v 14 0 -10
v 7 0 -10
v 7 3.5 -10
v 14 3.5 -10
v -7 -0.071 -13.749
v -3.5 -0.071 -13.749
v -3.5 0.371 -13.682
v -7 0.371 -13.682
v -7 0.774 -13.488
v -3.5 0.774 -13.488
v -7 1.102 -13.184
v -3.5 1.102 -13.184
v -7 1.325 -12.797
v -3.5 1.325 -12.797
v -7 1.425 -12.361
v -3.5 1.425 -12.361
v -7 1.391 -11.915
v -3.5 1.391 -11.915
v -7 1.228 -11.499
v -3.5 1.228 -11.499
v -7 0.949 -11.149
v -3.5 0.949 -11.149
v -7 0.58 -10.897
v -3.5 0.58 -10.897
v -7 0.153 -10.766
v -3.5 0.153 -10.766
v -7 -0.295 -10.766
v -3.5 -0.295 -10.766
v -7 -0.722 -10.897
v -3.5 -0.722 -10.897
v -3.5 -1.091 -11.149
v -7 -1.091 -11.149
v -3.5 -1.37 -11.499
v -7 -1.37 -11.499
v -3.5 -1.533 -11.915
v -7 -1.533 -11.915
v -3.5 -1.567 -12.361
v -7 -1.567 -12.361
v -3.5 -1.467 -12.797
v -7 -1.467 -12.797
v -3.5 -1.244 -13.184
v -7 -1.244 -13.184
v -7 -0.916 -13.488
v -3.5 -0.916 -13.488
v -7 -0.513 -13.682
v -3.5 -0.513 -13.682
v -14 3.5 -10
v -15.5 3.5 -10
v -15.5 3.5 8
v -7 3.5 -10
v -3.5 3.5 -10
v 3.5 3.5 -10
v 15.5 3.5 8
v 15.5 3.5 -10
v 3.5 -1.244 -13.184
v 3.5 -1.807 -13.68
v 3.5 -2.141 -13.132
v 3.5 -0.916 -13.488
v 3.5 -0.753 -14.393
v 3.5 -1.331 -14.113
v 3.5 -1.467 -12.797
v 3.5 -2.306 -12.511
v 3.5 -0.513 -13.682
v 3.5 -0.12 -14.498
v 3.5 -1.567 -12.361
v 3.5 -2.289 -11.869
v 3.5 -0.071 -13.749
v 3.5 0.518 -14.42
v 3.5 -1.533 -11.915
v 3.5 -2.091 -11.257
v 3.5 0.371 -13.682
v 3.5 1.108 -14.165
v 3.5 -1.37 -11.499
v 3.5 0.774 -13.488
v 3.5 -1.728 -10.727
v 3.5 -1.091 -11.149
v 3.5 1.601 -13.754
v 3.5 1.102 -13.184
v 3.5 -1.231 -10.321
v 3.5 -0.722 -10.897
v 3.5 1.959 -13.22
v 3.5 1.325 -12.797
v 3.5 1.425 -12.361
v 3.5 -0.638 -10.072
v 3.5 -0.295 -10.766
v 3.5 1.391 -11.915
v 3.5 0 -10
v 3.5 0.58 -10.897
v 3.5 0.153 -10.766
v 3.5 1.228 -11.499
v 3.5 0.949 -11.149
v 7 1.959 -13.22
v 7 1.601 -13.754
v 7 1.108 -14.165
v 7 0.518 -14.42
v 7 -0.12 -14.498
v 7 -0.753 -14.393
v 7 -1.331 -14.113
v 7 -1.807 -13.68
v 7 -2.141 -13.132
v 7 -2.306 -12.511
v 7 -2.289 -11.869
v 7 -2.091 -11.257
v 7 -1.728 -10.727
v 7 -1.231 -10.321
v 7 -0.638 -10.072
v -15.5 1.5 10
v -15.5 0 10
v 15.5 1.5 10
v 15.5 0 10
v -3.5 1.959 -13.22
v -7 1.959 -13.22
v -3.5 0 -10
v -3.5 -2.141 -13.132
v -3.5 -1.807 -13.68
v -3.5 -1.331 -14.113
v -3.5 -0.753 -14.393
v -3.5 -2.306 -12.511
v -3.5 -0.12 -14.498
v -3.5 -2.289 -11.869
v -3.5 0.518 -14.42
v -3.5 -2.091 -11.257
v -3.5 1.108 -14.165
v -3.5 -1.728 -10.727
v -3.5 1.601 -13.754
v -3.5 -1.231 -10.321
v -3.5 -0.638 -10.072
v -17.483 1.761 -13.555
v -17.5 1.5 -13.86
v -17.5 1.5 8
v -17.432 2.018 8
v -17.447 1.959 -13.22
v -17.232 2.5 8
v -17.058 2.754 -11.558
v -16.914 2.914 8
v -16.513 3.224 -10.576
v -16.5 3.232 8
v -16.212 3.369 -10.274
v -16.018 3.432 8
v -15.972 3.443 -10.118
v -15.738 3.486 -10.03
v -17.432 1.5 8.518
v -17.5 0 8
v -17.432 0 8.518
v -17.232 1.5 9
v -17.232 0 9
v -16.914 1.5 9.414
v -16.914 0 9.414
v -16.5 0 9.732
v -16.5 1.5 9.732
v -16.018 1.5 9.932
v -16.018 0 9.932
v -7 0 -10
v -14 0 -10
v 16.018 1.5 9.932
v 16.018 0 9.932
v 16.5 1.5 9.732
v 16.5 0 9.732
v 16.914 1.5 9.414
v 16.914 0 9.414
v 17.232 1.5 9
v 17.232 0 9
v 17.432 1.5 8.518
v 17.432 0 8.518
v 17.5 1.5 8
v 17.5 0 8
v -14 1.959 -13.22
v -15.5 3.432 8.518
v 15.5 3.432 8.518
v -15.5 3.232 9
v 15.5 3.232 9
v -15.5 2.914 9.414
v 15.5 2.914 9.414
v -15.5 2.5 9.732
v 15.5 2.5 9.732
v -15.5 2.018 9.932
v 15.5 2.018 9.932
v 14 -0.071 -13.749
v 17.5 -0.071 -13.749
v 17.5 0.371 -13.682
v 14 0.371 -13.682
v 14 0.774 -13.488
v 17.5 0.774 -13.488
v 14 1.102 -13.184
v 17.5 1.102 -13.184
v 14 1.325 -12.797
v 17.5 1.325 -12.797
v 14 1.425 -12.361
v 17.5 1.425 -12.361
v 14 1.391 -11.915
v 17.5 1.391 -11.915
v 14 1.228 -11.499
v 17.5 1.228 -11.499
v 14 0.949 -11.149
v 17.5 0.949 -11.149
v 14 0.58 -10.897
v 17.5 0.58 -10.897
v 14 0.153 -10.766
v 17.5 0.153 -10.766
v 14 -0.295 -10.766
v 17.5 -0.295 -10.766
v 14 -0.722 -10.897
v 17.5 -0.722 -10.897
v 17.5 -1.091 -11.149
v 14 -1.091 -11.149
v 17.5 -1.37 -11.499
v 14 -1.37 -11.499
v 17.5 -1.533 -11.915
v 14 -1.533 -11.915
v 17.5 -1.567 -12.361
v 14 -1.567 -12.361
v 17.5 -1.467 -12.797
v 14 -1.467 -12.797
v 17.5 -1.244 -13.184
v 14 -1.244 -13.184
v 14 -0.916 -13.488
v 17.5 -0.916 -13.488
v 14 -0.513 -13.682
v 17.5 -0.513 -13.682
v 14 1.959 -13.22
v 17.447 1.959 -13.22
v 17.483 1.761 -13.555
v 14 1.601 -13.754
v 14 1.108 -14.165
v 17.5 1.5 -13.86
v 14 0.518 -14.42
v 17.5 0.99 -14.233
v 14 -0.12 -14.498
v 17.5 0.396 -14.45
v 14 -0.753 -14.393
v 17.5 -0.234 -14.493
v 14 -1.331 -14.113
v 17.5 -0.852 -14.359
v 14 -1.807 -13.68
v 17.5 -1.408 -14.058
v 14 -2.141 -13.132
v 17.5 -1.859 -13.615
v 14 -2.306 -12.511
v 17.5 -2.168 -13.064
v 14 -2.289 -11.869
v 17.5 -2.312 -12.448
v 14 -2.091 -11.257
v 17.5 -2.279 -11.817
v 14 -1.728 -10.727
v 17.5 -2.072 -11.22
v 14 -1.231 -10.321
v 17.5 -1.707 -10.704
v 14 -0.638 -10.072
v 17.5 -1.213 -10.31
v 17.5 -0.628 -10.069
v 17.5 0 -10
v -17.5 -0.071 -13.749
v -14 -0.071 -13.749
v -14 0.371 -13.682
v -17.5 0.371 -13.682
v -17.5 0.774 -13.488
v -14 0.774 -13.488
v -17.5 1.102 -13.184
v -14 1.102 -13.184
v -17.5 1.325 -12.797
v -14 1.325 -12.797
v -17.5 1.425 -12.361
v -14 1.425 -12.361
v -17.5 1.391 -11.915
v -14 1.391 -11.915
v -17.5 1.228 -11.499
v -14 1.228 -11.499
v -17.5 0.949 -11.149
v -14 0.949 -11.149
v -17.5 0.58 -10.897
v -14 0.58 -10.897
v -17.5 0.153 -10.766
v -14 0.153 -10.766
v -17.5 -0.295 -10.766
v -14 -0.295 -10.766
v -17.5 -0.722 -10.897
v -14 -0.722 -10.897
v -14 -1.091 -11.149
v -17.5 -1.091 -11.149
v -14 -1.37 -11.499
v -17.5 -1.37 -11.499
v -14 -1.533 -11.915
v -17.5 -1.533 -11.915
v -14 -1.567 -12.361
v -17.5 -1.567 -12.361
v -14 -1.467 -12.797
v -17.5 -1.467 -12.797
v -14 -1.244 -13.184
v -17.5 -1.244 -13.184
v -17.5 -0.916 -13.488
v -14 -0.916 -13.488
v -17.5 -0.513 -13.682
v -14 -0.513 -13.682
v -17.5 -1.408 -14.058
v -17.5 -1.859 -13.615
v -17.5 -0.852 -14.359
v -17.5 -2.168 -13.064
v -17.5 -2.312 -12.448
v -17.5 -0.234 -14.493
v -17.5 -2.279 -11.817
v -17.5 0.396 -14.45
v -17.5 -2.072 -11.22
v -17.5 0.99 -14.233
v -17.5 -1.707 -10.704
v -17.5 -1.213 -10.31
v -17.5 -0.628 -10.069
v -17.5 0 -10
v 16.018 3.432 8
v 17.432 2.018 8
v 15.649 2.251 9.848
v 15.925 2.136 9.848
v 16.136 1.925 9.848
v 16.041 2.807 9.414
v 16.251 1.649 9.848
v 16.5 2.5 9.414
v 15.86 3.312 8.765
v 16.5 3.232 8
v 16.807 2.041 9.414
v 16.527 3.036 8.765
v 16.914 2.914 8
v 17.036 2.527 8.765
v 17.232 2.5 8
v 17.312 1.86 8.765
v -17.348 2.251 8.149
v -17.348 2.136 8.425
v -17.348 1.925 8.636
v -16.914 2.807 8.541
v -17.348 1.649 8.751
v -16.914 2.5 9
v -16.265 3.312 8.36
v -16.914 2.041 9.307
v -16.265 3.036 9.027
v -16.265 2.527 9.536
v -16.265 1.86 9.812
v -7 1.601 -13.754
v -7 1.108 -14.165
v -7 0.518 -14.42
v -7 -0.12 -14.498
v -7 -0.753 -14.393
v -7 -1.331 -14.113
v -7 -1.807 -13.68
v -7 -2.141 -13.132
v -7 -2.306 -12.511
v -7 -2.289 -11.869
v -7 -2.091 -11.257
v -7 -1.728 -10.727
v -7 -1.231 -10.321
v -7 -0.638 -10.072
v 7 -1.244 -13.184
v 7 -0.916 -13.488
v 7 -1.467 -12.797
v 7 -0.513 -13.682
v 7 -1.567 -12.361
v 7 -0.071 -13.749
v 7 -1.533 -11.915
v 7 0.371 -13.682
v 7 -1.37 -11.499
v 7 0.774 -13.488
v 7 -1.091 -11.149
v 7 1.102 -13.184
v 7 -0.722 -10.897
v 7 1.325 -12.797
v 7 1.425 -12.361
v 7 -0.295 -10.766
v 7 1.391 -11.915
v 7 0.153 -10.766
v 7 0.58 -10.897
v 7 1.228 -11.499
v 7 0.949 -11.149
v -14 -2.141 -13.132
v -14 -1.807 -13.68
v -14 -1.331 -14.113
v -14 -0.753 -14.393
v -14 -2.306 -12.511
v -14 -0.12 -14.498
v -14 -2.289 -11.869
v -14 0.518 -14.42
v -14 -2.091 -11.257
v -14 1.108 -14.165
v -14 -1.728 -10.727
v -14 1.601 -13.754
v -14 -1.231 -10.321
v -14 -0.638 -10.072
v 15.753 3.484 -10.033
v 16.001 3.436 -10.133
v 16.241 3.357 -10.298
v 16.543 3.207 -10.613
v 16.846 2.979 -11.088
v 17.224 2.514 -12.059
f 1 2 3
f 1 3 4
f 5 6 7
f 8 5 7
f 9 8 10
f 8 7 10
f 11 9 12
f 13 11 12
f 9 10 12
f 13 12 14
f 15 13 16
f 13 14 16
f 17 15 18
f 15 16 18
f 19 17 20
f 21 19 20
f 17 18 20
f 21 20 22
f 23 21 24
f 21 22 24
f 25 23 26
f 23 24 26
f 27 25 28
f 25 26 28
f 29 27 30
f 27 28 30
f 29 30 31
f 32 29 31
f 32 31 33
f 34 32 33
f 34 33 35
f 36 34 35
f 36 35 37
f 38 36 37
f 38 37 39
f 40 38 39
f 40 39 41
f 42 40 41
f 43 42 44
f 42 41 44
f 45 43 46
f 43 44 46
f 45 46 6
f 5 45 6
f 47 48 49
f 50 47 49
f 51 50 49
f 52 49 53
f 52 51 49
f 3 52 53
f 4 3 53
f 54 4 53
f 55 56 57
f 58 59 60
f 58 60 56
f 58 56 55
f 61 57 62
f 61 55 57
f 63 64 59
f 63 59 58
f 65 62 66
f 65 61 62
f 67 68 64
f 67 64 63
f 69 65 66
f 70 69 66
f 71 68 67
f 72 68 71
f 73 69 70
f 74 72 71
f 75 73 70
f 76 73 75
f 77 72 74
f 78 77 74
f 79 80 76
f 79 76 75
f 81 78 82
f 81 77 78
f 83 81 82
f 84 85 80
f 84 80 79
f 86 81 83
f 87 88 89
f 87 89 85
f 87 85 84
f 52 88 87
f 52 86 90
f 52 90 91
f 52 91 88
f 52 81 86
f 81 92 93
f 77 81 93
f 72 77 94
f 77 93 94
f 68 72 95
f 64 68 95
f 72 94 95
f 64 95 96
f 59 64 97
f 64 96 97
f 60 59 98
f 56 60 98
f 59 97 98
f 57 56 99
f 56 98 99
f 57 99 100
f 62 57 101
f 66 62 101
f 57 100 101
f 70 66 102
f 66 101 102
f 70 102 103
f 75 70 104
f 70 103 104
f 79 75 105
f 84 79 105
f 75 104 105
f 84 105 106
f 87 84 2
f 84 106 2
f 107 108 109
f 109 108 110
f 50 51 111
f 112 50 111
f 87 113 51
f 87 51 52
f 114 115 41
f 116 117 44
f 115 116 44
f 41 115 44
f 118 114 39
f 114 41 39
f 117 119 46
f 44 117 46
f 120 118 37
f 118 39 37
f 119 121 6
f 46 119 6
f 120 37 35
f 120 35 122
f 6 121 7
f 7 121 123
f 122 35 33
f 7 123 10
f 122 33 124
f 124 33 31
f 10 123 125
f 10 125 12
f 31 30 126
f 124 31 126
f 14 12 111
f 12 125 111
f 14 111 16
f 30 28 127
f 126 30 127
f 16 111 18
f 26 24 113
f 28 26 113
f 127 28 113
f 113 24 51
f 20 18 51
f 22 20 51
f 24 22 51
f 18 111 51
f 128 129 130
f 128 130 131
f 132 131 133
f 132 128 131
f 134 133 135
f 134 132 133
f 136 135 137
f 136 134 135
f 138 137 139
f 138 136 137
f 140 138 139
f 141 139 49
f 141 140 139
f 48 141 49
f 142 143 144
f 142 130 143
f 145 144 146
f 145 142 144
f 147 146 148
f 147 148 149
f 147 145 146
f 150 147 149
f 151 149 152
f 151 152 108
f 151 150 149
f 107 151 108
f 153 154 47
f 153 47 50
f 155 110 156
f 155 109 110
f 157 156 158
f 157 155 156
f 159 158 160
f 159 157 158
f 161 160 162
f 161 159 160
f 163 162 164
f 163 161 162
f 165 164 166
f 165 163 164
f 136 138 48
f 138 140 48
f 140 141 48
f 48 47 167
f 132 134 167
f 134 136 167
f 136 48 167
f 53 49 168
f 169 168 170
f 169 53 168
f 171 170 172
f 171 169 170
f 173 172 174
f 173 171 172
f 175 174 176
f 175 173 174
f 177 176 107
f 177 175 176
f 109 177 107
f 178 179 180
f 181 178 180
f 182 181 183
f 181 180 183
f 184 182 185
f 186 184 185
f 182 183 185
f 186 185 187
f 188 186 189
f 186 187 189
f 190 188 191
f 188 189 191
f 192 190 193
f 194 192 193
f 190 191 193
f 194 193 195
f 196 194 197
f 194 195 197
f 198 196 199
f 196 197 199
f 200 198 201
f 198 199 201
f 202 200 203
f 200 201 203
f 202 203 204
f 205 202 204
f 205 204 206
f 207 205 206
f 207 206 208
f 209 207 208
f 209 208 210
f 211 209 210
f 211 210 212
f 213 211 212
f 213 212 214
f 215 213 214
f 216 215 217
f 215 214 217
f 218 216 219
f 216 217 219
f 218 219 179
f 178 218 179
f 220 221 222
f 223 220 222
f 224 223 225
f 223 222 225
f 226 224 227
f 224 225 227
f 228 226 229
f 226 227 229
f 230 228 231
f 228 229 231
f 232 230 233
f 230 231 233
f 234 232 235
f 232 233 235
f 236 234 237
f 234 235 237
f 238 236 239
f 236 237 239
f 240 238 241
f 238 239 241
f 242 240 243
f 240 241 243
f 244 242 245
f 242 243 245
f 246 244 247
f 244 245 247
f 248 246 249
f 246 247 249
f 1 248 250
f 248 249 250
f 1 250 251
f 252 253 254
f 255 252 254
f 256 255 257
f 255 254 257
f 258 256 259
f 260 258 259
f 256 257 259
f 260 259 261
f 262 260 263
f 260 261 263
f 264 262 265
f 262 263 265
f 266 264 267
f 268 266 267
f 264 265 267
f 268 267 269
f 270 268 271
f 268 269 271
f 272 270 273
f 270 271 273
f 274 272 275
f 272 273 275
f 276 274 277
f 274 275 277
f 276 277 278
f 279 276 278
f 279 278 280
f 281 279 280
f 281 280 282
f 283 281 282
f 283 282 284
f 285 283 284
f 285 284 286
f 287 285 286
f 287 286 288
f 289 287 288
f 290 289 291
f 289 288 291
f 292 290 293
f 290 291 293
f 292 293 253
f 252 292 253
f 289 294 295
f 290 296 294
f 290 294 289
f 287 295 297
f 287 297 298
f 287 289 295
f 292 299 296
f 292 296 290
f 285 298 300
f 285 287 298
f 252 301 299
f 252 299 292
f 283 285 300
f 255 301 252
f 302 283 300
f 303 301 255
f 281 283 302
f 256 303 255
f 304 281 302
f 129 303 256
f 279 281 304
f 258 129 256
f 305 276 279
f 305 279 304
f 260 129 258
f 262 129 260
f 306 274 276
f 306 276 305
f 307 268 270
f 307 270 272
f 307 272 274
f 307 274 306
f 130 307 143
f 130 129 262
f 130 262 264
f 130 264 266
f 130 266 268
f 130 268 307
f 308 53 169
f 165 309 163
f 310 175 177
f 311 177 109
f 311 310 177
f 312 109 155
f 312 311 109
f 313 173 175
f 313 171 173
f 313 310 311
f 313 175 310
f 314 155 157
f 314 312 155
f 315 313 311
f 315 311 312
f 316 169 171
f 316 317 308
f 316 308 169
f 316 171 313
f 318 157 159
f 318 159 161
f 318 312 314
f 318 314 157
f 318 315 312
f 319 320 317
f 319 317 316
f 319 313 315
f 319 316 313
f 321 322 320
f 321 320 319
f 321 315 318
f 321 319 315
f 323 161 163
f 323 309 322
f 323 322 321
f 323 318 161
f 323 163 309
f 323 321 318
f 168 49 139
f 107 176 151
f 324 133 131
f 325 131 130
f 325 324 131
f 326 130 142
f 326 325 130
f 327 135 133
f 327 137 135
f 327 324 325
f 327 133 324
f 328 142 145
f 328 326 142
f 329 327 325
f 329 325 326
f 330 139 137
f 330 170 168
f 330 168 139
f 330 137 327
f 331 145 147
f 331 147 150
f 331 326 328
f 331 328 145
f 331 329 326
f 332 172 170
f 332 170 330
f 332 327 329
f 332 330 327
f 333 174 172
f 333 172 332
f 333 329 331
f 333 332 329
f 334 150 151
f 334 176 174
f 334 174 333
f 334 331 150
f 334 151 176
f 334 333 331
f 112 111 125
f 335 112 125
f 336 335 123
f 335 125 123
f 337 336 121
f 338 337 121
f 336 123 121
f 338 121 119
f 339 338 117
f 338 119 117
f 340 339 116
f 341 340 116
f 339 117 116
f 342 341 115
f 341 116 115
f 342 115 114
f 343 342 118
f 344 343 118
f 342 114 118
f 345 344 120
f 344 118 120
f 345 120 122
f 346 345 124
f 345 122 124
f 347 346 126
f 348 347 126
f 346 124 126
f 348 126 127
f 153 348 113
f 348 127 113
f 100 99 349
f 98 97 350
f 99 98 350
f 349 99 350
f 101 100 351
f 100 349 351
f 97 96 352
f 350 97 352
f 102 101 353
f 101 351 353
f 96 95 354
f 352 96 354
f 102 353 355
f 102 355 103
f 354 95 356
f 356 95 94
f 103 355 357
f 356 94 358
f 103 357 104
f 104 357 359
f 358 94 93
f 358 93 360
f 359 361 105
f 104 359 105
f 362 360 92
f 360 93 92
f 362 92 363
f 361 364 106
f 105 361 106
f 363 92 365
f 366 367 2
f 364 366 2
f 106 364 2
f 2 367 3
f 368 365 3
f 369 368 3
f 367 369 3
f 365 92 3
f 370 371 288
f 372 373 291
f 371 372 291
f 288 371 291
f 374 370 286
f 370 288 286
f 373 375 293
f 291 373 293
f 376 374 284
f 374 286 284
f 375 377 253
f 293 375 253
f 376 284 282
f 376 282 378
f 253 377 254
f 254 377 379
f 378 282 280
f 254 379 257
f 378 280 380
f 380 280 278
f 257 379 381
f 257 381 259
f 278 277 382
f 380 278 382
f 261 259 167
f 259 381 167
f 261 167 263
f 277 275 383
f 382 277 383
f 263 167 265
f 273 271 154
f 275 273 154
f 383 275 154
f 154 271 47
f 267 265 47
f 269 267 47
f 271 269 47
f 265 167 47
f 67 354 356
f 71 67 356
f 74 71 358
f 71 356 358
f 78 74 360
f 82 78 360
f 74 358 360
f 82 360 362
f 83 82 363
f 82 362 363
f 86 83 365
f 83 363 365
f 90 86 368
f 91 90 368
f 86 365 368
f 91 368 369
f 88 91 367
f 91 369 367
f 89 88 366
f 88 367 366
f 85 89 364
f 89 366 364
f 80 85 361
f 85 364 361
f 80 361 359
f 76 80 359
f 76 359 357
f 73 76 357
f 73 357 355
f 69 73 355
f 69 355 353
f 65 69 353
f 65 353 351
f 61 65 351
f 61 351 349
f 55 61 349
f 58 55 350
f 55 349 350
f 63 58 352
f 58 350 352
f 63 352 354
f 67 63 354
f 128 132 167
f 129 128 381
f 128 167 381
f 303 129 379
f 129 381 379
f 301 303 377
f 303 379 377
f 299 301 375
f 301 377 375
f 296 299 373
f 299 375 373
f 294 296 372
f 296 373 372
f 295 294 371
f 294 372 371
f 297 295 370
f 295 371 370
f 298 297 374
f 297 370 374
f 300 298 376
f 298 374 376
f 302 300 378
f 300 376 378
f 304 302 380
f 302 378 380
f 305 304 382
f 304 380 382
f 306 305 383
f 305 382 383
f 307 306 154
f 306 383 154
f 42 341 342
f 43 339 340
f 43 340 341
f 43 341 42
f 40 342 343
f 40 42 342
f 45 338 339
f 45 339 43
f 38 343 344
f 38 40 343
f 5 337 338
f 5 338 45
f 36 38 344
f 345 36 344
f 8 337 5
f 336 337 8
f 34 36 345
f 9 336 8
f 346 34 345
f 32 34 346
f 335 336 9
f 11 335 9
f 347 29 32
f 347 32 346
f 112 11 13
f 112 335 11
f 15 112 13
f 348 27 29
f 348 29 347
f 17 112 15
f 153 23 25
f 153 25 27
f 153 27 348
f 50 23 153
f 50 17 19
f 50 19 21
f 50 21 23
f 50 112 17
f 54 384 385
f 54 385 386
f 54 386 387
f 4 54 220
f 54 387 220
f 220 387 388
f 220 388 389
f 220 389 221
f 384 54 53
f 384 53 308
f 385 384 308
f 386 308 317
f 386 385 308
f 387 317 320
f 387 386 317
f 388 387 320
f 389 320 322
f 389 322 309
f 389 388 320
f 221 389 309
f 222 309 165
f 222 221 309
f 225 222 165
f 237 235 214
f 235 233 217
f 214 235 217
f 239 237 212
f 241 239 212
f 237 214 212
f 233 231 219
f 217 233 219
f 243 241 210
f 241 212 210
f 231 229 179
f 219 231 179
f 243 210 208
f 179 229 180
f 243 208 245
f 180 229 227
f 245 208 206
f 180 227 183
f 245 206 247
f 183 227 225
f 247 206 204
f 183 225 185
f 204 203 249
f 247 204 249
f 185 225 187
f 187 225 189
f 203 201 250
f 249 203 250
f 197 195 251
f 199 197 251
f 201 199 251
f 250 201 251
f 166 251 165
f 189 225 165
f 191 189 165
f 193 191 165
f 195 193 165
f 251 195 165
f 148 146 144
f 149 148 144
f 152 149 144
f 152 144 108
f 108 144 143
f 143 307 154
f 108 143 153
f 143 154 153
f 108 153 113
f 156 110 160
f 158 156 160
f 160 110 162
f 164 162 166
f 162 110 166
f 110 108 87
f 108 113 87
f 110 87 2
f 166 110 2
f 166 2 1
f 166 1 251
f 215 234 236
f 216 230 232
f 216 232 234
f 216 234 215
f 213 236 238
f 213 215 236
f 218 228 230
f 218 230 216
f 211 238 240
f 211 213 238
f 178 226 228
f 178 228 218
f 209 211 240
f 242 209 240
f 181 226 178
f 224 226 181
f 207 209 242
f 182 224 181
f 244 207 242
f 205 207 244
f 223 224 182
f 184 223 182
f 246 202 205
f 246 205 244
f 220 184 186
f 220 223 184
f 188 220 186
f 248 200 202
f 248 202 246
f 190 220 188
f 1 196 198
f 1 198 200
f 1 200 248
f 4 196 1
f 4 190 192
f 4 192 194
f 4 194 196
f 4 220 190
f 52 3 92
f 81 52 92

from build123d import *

# Parameters (mm, degrees)
SKETCH1_W           = 35
SKETCH1_H           = 20
BOSS_EXTRUDE1_DEPTH = 3.5
SKETCH3_R           = 1.5
BOSS_EXTRUDE2_DEPTH = 3.5
LPATTERN1_COUNT     = 4
LPATTERN1_PITCH     = 10.5
FILLET1_R           = 2


with BuildPart() as part:
    # Sketch1 → Boss-Extrude1 (new body)
    with BuildSketch(Plane(origin=(0, 0, 0), x_dir=(1, 0, 0), z_dir=(0, 1, 0))):
        Rectangle(SKETCH1_W, SKETCH1_H)
    extrude(amount=BOSS_EXTRUDE1_DEPTH)

    # Sketch3 → Boss-Extrude2 (add)
    with BuildSketch(Plane(origin=(17.5, 0, 0), x_dir=(0, 0, -1), z_dir=(1, 0, 0))):
        with BuildLine():
            ThreePointArc((13.220333212, 1.958519537), (13.418028169, -1.993351189), (10, 0))
            Line((10, 0), (10, 3.5))
            Line((10, 3.5), (13.220333212, 1.958519537))
        make_face()
        with Locations((12.248880815, -0.070958288)):
            Circle(SKETCH3_R, mode=Mode.SUBTRACT)
    boss_extrude2 = extrude(amount=-BOSS_EXTRUDE2_DEPTH)

    # LPattern1: Boss-Extrude2 ×4
    with Locations(*[(-i * LPATTERN1_PITCH, 0, 0) for i in range(1, LPATTERN1_COUNT)]):
        add(boss_extrude2)

    # Fillet1
    fillet1_edges = [part.edges().sort_by_distance(p)[0] for p in [
        (17.5, 3.5, 0),
        (0, 3.5, 10),
        (-17.5, 3.5, 0),
        (-17.5, 1.75, 10),
        (17.5, 1.75, 10),
    ]]
    fillet(fillet1_edges, radius=FILLET1_R)


solid = part.part
